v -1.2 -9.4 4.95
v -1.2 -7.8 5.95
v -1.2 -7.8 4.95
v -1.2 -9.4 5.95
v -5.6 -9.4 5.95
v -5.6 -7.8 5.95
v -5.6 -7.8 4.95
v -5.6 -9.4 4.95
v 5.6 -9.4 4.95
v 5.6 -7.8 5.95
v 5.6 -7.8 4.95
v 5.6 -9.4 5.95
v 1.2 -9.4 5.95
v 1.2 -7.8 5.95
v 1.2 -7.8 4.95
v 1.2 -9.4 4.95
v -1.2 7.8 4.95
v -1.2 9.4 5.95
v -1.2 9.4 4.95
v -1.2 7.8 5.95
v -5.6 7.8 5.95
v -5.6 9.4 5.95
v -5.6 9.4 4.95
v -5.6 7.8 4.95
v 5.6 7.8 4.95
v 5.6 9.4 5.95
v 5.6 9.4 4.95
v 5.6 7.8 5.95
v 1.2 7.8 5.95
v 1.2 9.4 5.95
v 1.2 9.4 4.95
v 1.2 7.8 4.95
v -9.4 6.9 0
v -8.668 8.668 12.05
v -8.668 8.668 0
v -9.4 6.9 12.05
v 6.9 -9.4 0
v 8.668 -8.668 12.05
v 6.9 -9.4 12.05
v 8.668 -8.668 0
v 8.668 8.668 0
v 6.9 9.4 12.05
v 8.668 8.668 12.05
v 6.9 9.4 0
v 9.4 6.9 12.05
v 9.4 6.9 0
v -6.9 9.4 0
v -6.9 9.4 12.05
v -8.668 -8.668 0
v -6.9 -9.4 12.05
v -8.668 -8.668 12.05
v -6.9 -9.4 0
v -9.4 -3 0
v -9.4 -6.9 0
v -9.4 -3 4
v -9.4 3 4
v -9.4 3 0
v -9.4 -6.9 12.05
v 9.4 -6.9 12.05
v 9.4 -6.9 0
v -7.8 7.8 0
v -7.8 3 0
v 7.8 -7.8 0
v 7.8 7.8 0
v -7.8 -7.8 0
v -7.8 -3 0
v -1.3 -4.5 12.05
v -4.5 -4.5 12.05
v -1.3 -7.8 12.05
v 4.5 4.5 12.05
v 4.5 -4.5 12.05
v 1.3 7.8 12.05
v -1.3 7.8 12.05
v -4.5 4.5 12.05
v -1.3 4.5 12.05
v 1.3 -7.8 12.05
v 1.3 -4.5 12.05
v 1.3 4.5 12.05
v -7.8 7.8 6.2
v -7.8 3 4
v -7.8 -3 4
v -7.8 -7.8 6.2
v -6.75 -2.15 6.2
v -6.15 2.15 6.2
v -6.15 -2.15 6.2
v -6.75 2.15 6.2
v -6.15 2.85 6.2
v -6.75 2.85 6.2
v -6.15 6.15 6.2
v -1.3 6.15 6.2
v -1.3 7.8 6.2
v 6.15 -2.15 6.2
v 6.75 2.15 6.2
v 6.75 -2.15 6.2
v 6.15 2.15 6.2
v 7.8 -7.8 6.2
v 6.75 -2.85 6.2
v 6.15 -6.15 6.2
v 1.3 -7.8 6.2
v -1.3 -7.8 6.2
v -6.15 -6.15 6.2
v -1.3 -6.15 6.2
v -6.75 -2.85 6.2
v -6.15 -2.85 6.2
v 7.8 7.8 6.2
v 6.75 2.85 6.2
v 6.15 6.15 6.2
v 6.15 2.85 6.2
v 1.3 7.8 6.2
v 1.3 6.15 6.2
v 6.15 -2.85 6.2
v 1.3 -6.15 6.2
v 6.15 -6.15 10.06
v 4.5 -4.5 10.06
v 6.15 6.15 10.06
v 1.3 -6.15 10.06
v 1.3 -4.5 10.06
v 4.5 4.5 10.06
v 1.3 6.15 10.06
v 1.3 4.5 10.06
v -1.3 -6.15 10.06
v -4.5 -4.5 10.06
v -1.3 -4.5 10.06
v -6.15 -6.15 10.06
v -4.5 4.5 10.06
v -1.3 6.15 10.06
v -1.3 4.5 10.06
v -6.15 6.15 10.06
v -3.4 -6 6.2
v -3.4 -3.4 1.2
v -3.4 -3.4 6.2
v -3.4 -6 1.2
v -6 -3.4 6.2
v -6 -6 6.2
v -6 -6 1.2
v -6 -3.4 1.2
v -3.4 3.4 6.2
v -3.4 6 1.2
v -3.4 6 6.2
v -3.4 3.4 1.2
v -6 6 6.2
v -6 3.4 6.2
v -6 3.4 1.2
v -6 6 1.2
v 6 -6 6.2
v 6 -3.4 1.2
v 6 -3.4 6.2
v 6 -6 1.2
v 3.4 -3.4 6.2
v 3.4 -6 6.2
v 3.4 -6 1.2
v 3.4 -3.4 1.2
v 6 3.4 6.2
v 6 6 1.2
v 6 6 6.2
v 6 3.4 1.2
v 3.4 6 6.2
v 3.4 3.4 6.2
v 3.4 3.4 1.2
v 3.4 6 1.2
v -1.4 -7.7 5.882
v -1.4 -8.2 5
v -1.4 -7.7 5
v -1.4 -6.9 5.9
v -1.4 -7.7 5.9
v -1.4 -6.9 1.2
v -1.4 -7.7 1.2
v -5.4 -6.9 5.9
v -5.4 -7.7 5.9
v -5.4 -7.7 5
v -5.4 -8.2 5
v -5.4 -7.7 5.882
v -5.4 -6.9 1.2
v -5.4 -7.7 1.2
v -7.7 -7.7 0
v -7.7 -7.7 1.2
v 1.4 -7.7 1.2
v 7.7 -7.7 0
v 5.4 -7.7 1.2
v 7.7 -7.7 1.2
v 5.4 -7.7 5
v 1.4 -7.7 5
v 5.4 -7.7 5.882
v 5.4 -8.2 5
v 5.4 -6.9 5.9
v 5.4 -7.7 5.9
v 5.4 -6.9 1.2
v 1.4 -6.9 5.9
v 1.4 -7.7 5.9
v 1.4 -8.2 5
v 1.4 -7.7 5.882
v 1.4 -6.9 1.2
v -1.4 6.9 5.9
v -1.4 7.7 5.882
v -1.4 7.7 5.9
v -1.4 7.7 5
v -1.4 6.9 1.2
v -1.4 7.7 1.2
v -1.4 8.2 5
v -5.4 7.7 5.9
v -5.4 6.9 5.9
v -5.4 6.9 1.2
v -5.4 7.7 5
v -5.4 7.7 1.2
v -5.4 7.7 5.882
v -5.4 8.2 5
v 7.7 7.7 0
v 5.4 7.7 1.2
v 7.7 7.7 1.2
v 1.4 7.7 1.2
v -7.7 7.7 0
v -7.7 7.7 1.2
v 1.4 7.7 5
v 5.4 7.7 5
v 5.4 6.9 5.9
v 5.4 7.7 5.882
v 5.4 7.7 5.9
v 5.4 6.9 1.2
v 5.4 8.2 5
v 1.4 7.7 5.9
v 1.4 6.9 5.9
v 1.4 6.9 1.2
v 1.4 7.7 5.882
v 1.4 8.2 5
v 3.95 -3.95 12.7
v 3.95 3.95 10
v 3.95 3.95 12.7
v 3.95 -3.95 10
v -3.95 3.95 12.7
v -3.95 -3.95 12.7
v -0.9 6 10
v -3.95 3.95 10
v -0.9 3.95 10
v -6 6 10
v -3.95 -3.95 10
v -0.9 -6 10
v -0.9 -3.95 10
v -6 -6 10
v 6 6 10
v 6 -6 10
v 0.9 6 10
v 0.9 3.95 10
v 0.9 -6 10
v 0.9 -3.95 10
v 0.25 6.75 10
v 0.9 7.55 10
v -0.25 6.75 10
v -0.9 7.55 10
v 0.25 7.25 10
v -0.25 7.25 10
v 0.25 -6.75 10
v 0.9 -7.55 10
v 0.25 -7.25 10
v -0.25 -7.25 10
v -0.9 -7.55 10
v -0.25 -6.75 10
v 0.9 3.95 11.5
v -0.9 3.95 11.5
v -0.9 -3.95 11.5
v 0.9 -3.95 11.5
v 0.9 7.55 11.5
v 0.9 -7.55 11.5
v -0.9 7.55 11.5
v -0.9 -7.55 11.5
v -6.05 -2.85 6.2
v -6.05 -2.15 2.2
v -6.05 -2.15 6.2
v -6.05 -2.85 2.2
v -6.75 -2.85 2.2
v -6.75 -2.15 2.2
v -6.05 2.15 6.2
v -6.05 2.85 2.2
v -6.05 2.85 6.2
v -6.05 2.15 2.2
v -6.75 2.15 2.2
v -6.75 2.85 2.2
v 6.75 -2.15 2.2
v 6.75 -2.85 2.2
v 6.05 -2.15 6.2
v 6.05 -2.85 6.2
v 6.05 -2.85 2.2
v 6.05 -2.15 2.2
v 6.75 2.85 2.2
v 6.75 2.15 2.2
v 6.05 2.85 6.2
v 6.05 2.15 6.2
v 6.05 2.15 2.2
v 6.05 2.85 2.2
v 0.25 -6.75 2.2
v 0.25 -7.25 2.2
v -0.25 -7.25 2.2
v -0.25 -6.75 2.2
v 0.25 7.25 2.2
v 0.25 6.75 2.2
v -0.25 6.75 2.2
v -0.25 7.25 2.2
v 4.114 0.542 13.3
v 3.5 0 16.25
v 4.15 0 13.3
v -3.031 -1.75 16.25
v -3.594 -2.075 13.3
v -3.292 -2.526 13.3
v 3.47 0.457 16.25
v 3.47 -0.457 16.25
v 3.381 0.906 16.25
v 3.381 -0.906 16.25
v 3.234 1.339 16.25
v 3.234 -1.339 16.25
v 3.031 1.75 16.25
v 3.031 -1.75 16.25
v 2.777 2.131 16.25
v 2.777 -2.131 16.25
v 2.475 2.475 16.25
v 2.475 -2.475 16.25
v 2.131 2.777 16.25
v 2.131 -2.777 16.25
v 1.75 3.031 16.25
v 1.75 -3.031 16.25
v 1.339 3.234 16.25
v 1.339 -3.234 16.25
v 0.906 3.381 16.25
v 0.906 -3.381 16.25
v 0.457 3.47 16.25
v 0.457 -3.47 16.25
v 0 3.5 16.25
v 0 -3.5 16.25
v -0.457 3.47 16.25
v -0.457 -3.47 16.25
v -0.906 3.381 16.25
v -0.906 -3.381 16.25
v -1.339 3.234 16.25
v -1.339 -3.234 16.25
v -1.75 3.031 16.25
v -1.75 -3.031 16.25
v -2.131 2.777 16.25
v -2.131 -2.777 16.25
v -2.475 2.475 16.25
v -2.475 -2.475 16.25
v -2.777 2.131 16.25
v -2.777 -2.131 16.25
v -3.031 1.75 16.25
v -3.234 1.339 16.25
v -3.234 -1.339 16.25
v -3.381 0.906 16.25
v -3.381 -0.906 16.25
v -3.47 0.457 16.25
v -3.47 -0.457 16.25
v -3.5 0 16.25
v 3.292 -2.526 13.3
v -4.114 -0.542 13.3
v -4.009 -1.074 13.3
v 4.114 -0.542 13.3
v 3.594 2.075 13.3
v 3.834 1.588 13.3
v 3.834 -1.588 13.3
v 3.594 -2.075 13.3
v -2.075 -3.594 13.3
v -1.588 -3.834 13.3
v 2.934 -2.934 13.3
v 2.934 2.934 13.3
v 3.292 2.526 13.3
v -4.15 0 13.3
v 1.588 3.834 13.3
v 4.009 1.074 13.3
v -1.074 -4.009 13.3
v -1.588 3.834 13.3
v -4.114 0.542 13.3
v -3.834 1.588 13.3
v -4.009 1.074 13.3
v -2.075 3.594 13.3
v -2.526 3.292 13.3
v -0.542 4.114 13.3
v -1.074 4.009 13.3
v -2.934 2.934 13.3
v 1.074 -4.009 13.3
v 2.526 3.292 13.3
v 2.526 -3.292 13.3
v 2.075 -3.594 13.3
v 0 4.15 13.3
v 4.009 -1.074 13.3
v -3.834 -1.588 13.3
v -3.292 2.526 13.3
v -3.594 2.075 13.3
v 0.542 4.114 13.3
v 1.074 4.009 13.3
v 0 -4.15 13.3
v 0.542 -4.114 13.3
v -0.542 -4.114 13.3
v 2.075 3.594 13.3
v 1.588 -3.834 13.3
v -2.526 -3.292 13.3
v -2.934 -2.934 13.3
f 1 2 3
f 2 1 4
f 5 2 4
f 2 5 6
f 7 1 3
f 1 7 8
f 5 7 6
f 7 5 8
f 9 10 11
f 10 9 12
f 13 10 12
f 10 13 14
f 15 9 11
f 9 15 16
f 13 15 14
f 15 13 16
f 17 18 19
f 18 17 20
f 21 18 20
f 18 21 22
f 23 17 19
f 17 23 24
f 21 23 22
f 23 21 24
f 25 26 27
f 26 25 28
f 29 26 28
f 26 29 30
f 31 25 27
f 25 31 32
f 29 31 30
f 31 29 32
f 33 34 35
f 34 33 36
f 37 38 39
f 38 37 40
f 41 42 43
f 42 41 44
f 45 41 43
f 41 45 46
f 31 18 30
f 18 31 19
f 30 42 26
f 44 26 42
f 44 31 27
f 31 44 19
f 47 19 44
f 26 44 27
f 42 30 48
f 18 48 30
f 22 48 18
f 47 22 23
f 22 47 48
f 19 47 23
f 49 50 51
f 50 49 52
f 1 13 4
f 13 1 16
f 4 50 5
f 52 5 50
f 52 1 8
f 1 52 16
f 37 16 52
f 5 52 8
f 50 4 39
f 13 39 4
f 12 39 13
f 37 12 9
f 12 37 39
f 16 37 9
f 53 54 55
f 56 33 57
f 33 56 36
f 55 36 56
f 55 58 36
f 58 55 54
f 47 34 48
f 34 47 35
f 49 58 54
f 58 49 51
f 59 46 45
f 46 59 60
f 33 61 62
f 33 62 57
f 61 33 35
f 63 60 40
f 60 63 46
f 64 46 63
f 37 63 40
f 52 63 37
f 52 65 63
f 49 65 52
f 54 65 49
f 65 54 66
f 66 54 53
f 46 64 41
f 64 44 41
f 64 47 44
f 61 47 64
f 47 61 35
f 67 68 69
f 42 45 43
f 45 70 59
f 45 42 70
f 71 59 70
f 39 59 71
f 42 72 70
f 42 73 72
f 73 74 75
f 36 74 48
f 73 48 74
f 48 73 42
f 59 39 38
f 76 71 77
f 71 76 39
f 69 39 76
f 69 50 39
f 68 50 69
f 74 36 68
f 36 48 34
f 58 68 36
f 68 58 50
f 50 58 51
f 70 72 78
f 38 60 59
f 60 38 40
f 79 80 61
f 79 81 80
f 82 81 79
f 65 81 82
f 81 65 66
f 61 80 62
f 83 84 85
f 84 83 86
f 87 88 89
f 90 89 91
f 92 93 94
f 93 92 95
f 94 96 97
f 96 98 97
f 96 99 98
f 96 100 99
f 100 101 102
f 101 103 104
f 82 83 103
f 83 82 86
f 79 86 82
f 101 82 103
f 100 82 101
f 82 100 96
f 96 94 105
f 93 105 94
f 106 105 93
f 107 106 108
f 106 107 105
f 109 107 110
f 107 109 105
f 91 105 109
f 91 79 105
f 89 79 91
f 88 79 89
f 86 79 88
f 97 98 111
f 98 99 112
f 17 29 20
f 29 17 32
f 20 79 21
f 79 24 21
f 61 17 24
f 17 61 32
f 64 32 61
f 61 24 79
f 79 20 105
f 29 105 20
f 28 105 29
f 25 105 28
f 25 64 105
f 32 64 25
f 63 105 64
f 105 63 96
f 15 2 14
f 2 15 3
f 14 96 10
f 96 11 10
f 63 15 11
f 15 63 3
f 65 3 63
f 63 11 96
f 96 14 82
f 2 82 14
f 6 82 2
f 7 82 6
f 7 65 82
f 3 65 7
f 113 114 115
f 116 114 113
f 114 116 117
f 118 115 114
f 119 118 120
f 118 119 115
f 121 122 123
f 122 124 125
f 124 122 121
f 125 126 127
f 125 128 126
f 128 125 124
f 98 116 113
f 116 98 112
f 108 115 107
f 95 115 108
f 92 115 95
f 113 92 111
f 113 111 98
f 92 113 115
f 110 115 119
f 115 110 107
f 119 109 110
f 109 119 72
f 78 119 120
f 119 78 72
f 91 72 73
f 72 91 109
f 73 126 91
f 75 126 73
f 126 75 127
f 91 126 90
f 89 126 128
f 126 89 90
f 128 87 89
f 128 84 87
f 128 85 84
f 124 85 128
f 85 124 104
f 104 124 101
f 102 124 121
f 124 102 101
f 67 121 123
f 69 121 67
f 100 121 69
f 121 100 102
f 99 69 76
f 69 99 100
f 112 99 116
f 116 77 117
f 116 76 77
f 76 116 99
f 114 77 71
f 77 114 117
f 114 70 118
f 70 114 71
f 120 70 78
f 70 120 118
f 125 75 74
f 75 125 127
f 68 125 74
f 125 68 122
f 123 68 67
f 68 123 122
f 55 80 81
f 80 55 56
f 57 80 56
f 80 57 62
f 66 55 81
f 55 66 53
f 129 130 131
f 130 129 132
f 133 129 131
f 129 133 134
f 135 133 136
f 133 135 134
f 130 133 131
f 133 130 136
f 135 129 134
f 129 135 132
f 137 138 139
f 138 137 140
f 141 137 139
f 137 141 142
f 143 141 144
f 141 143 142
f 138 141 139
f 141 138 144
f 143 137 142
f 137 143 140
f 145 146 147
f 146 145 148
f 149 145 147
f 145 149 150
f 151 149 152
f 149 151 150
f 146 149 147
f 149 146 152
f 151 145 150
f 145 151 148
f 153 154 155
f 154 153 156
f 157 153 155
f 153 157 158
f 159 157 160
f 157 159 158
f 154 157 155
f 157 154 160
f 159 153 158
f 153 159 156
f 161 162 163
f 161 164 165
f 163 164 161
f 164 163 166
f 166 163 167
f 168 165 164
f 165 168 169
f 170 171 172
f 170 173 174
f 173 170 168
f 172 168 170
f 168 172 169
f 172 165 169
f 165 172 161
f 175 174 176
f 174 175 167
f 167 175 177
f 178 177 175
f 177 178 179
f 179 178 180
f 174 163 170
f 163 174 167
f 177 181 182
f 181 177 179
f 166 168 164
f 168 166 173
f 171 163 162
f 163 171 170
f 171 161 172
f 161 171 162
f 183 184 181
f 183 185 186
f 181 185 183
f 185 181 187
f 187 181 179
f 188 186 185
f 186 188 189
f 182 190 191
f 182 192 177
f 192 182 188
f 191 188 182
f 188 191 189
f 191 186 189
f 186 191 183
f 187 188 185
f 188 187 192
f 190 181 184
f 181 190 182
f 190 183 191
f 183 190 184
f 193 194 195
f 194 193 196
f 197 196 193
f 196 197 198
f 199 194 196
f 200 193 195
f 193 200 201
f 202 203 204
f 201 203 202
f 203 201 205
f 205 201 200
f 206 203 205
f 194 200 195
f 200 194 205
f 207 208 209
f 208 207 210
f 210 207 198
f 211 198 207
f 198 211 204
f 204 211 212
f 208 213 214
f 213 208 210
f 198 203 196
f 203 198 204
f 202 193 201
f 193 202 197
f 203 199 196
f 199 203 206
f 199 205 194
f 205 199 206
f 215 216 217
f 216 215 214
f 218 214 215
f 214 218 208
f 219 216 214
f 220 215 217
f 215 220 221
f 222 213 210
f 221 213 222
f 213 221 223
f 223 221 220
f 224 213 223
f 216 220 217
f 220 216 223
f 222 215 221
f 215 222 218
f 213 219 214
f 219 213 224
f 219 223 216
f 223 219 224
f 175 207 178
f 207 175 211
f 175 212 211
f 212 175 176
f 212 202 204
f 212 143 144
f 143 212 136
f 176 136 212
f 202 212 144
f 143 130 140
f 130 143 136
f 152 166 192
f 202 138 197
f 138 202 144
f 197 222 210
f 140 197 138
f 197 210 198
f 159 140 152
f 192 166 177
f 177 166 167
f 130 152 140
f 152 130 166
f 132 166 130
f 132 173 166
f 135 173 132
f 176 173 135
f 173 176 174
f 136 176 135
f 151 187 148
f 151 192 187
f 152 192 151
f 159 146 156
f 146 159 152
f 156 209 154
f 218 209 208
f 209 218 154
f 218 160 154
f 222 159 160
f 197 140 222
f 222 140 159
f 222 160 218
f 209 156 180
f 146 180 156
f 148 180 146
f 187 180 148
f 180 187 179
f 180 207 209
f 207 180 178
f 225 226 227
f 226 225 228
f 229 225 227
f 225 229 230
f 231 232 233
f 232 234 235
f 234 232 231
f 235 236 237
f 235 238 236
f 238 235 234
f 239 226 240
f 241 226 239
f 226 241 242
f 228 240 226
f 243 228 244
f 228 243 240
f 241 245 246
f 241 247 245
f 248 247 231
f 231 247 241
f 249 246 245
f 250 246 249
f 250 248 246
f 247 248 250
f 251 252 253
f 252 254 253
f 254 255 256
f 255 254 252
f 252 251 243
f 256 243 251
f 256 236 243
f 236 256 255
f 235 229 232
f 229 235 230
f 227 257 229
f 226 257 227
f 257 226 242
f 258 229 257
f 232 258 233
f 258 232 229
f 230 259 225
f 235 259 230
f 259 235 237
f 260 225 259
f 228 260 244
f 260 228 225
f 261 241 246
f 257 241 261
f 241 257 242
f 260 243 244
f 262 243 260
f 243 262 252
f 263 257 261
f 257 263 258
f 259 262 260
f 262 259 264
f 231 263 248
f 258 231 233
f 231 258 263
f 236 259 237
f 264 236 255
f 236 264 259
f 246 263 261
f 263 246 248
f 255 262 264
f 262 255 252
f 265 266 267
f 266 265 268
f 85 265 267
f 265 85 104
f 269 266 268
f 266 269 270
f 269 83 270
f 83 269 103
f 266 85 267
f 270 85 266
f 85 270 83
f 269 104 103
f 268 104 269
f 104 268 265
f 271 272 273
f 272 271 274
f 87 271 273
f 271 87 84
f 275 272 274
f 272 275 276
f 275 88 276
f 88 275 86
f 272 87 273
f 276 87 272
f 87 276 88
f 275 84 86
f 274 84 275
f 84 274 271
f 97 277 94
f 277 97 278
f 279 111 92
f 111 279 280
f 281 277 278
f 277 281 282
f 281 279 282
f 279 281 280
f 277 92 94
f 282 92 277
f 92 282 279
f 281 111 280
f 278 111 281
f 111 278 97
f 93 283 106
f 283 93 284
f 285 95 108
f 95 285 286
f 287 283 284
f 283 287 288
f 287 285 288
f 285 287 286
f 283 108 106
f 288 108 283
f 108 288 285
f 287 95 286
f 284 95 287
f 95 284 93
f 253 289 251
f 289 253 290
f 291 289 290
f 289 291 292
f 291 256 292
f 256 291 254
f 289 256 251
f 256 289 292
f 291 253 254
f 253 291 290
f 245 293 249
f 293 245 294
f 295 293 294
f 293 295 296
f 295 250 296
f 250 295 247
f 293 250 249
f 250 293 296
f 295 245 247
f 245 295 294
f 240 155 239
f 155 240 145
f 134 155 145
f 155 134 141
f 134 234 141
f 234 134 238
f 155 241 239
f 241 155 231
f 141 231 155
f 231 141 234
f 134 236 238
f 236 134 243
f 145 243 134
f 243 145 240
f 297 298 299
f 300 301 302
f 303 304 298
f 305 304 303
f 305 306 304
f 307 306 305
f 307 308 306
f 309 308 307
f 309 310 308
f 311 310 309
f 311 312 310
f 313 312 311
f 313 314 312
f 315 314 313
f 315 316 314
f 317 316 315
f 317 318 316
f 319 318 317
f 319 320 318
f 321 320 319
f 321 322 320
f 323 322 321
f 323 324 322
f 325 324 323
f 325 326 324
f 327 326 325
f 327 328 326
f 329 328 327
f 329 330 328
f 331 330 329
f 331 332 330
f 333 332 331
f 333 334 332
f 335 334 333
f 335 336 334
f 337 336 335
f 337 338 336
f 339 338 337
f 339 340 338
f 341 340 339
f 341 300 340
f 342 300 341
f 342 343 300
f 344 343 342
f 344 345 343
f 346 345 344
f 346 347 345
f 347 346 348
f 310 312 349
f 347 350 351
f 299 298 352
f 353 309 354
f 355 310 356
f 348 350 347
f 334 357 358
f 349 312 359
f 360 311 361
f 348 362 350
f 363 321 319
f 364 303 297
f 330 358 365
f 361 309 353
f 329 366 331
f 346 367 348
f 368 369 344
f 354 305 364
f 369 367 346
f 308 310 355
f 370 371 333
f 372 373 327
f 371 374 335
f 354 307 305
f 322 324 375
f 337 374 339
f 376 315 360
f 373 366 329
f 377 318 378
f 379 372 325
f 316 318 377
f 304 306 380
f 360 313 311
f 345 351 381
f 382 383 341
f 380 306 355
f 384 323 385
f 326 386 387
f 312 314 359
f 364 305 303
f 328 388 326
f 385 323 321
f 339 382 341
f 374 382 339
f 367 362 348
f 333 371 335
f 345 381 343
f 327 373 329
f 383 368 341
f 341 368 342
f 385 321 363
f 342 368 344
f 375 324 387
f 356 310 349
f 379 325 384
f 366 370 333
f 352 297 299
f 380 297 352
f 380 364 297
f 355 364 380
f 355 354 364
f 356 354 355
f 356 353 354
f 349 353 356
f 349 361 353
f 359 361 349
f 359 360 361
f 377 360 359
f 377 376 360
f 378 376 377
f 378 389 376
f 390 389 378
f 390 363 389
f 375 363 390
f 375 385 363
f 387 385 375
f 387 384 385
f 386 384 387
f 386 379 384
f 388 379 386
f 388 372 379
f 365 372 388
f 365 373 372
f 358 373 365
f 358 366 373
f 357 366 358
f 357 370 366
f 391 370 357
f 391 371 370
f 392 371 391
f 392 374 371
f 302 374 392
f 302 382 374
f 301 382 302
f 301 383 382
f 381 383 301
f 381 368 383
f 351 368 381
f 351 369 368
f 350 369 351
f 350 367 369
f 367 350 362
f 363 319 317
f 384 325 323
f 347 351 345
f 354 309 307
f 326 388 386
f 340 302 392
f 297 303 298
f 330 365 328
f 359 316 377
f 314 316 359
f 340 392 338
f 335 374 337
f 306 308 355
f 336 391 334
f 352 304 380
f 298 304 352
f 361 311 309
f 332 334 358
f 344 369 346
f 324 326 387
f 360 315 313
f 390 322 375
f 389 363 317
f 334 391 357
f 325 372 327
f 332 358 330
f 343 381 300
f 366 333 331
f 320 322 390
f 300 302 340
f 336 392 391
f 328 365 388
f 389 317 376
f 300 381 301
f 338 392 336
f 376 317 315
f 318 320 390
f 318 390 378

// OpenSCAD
// The LED button (Omten TSD1265) in its own small box, wired to case B's
// EXT window, taped wherever it's handy (case B's lid, the frame).
//
// Two parts. The box's top rests on the black base, so everything white
// stands out through it: the cap sits about 4 mm proud. The base plate
// snaps in from below (two clips a side, into windows in the box's walls;
// push the hooks in through the windows to take it out again) and holds the
// body up on four corner posts, so a press goes straight into whatever the
// box is taped to.
//
// Solder the wires first, with their connector already on, then put the
// button in. The wires leave by a notch in one wall that's open at the
// bottom: lay them in from below and snap the plate on, the connector never
// goes through anything. Cut the legs to about 4 mm.
//
// Print the box top down (part = "box" lays it out that way) and the plate
// flat, both without supports.
//
//   openscad -o button_box.stl   -D 'part="box"'   button_box.scad
//   openscad -o button_plate.stl -D 'part="plate"' button_box.scad

// From the TSD1265 drawing. The LED tabs stick out along Y from the white
// part, over the black base; the switch legs come out the X sides, 5
// apart, and bend out to 13.5 across.
btn_w = 12;
btn_base_h = 3.8;
btn_shoulder_h = 6.5;  // body bottom to the white part's fixed square top
btn_shoulder_w = 7.9;
btn_h = 10.05;         // body bottom to the cap's top
btn_cap_d = 8.3;
btn_tabs = [15.1, 1.8];

fit = 0.15;      // around the body
under = 5.0;     // under the body: cut legs, solder, wires, the clips
top_t = 2.0;
wall = 1.6;
plate_t = 1.2;
room = 15.6;     // under the body: the bent legs and the LED legs
r = 2.5;         // outside corners
hole = 9.0;      // the top's square hole, round the white part
tab_slot = 2.6;  // for the LED tabs and their legs, along Y
notch = [6, 2.8];  // the wires' way out, over the plate: wide, tall

// The clips: on the ±Y sides, clear of the LED legs (x = 0) and the posts.
clip_x = [1.4, 5.4];  // from, to (and mirrored)
clip_t = 0.8;
hook = 0.5;           // how far the hook stands out of the clip
hook_z = 5.0;         // its flat, catching face
plate_c = 0.1;        // around the plate

body_z = plate_t + under;
top_z = body_z + btn_base_h + 0.05;  // the top's underside, on the black base
h = top_z + top_t;
proud = body_z + btn_h - h;
outer = room + 2 * wall;
plate_w = room - 2 * plate_c;

module rsquare(s, rr) { offset(r = rr) offset(delta = -rr) square(s, center = true); }

module cross(sq) {
    square(sq, center = true);
    square([tab_slot, room], center = true);
}

module box() {
    color("#78909c") difference() {
        linear_extrude(h) rsquare(outer, r);
        translate([0, 0, -1]) linear_extrude(body_z + 1) square(room, center = true);
        translate([0, 0, body_z - 0.01]) linear_extrude(top_z - body_z + 0.02) cross(btn_w + 2 * fit);
        translate([0, 0, top_z - 0.01]) linear_extrude(top_t + 1) cross(hole);
        // The wires' way out, open at the bottom.
        translate([-outer / 2 - 1, -notch[0] / 2, -1]) cube([wall + 2, notch[0], plate_t + notch[1] + 1]);
        // Windows the clips' hooks catch in.
        for (s = [-1, 1], sx = [-1, 1])
            translate([sx > 0 ? clip_x[0] - 0.2 : -clip_x[1] - 0.2, s > 0 ? room / 2 - 0.5 : -outer / 2 - 0.5, hook_z - 0.05])
                cube([clip_x[1] - clip_x[0] + 0.4, wall + 1, 1.0]);
    }
}

module plate() {
    c = 2.6;
    color("#b0bec5") {
        translate([0, 0, 0]) linear_extrude(plate_t) square(plate_w, center = true);
        // Posts under the body's corners, clear of the legs (mid X sides)
        // and the LED legs (mid Y sides).
        for (sx = [-1, 1], sy = [-1, 1])
            translate([sx * (btn_w / 2 - c / 2) - c / 2, sy * (btn_w / 2 - c / 2) - c / 2, plate_t - 0.01]) cube([c, c, under + 0.01]);
        // The clips, flush with the plate's edge, and their hooks: a flat
        // face underneath to catch, a ramp on top to go in.
        for (s = [-1, 1], sx = [-1, 1]) mirror([0, s < 0 ? 1 : 0, 0])
            translate([sx > 0 ? clip_x[0] : -clip_x[1], 0, 0]) {
                translate([0, plate_w / 2 - clip_t, plate_t - 0.01]) cube([clip_x[1] - clip_x[0], clip_t, hook_z + 0.9 - plate_t + 0.01]);
                rotate([90, 0, 90]) linear_extrude(clip_x[1] - clip_x[0])
                    polygon([[plate_w / 2 - 0.01, hook_z], [plate_w / 2 + hook, hook_z], [plate_w / 2 - 0.01, hook_z + 0.9]]);
            }
    }
}

module button() {
    translate([0, 0, body_z]) {
        color("#222") translate([-btn_w / 2, -btn_w / 2, 0]) cube([btn_w, btn_w, btn_base_h]);
        color("#eee") {
            translate([-btn_shoulder_w / 2, -btn_shoulder_w / 2, btn_base_h]) cube([btn_shoulder_w, btn_shoulder_w, btn_shoulder_h - btn_base_h]);
            translate([-btn_tabs[1] / 2, -btn_tabs[0] / 2, btn_base_h]) cube([btn_tabs[1], btn_tabs[0], 1.5]);
        }
        color("#9e9e9e") {
            for (sx = [-1, 1], sy = [-1, 1]) translate([sx * 6.4 - 0.35, sy * 2.5 - 0.35, -4]) cube([0.7, 0.7, 4]);
            for (sy = [-1, 1]) translate([-0.25, sy * 7.0 - 0.25, -4]) cube([0.5, 0.5, 4 + btn_base_h]);
        }
        color("#fffde7") translate([0, 0, btn_h - 2.95]) cylinder(d1 = btn_cap_d, d2 = 7, h = 2.95, $fn = 48);
    }
}

echo(str("button box: ", outer, " x ", outer, " x ", h, " mm, cap ", proud, " out of the top"));

part = "assembly";  // "box", "plate", "assembly", "exploded", "none"
if (part == "box") translate([0, 0, h]) rotate([180, 0, 0]) box();  // turned over, not mirrored
else if (part == "plate") plate();
else if (part == "assembly") { box(); plate(); button(); }
else if (part == "exploded") { translate([0, 0, 22]) box(); translate([0, 0, 10]) button(); plate(); }
